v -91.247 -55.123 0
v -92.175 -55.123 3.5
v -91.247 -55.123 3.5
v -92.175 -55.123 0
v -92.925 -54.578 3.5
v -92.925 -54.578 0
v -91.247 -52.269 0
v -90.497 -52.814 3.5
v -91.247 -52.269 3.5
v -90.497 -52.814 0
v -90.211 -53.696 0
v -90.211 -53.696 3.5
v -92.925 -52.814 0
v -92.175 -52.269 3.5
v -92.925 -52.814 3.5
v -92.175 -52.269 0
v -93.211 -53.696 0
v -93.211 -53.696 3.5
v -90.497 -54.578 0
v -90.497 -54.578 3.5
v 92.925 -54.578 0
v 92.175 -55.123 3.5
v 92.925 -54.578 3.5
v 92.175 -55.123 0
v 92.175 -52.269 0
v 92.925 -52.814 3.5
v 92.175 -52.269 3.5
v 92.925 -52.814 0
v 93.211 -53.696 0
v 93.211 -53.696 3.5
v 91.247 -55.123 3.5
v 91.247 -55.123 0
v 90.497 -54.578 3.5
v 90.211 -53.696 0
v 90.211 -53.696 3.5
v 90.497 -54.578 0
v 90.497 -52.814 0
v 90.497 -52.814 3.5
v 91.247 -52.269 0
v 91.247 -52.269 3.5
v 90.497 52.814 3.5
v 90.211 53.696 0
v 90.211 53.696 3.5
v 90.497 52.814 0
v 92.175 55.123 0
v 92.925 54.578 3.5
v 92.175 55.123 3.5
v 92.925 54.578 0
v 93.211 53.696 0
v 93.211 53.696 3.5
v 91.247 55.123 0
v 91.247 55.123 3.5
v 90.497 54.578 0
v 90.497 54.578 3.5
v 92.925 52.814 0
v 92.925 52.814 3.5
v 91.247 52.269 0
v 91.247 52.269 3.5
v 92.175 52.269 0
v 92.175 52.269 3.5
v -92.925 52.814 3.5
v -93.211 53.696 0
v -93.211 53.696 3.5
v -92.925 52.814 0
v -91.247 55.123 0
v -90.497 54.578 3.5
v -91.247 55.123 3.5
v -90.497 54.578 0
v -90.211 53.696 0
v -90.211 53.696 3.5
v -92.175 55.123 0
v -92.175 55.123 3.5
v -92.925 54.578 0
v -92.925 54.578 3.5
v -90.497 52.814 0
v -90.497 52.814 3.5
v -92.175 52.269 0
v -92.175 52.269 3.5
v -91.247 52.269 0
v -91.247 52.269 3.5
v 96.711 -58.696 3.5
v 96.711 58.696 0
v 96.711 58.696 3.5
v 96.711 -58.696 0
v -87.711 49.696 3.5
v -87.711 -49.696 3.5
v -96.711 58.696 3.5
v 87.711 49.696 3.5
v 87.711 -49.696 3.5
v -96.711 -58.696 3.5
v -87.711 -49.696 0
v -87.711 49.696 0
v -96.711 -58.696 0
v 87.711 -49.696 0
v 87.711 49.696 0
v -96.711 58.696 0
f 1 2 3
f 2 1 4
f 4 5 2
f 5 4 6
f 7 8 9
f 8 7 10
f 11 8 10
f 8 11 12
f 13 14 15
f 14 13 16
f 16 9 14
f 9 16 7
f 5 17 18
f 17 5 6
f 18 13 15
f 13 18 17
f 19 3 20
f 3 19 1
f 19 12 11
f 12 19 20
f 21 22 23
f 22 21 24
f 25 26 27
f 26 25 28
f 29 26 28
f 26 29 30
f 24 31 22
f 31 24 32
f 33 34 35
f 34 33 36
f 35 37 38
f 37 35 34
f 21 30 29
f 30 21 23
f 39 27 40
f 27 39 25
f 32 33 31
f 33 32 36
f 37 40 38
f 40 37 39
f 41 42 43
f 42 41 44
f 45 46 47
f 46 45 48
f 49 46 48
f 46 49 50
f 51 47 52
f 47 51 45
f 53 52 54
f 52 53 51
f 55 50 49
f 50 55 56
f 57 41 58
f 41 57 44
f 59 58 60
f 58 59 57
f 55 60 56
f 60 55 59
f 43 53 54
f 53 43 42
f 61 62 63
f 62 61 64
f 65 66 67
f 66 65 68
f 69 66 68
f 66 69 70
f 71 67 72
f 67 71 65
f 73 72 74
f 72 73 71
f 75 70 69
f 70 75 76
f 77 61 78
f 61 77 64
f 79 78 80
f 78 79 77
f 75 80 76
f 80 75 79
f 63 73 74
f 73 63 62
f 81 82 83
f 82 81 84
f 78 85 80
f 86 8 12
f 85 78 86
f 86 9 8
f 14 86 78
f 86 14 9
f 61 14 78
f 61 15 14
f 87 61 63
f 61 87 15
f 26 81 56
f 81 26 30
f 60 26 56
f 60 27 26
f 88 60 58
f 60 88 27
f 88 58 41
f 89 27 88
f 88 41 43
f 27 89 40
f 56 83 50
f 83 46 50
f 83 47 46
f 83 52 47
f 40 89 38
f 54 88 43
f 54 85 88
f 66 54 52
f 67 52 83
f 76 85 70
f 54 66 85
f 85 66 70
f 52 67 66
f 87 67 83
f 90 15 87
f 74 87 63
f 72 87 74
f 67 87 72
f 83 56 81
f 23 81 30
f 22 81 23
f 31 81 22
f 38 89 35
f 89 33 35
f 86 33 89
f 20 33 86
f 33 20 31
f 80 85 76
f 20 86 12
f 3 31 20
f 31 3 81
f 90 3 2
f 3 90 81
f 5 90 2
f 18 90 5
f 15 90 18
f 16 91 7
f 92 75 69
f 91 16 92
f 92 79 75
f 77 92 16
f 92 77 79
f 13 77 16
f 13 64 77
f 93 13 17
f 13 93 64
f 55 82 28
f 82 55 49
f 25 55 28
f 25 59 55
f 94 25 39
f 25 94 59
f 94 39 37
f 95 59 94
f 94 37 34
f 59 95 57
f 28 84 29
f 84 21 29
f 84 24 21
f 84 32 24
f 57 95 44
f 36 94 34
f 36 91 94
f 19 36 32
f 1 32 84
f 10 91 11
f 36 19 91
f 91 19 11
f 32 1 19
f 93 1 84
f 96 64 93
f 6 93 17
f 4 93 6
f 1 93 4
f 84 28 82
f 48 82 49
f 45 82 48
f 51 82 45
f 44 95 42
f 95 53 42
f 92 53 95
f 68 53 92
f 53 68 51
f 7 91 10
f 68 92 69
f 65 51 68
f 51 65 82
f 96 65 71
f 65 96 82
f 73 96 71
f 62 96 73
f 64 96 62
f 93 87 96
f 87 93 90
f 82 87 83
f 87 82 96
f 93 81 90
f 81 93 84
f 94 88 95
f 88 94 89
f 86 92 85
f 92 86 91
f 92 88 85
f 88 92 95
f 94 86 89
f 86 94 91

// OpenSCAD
// file: ../pills/negative_screw.scad
use <dimensions.scad>

thickness = 3;
module negative_screw() {
    translate([-plate_width()/2 + hole_offset(), -plate_height()/2 + hole_offset(), 0])
        cylinder(h = thickness * 2, r = hole_radius(), center=true);
    translate([plate_width()/2 - hole_offset(), -plate_height()/2 + hole_offset(), 0])
        cylinder(h = thickness * 2, r = hole_radius(), center=true);
    translate([plate_width()/2 - hole_offset(), plate_height()/2 - hole_offset(), 0])
        cylinder(h = thickness * 2, r = hole_radius(), center=true);
    translate([-plate_width()/2 + hole_offset(), plate_height()/2 - hole_offset(), 0])
        cylinder(h = thickness * 2, r = hole_radius(), center=true);
}

negative_screw();
// file: ../pills/dimensions.scad
function plate_width() = 193.422;
function plate_height() = 117.392;
function plate_thickness() = 3;
function separation() = 5;
function led_width() = 10;
function led_height() = 2.5;
function hole_radius() = 1.5;
function hole_offset() = 3.5 + hole_radius();
function separator_thickness() = (led_width()-plate_thickness())/2;

function electronics_width() = 81.3;
function electronics_height() = 50.7;
function electronics_thickness() = 23;
// main file
use <../pills/dimensions.scad>
use <../pills/negative_screw.scad>

$fs = 1;
$fa = 0.4;

module plate_spacer() {
    translate([0, 0, separator_thickness()/2])
    difference() {
        cube([
            plate_width(),
            plate_height(),
            separator_thickness()
            ], center=true);
        cube([
            plate_width() - hole_offset()*4 + 2,
            plate_height() - hole_offset()*4 + 2,
            3*2
            ], center=true);
        negative_screw();
    }
}

plate_spacer();
